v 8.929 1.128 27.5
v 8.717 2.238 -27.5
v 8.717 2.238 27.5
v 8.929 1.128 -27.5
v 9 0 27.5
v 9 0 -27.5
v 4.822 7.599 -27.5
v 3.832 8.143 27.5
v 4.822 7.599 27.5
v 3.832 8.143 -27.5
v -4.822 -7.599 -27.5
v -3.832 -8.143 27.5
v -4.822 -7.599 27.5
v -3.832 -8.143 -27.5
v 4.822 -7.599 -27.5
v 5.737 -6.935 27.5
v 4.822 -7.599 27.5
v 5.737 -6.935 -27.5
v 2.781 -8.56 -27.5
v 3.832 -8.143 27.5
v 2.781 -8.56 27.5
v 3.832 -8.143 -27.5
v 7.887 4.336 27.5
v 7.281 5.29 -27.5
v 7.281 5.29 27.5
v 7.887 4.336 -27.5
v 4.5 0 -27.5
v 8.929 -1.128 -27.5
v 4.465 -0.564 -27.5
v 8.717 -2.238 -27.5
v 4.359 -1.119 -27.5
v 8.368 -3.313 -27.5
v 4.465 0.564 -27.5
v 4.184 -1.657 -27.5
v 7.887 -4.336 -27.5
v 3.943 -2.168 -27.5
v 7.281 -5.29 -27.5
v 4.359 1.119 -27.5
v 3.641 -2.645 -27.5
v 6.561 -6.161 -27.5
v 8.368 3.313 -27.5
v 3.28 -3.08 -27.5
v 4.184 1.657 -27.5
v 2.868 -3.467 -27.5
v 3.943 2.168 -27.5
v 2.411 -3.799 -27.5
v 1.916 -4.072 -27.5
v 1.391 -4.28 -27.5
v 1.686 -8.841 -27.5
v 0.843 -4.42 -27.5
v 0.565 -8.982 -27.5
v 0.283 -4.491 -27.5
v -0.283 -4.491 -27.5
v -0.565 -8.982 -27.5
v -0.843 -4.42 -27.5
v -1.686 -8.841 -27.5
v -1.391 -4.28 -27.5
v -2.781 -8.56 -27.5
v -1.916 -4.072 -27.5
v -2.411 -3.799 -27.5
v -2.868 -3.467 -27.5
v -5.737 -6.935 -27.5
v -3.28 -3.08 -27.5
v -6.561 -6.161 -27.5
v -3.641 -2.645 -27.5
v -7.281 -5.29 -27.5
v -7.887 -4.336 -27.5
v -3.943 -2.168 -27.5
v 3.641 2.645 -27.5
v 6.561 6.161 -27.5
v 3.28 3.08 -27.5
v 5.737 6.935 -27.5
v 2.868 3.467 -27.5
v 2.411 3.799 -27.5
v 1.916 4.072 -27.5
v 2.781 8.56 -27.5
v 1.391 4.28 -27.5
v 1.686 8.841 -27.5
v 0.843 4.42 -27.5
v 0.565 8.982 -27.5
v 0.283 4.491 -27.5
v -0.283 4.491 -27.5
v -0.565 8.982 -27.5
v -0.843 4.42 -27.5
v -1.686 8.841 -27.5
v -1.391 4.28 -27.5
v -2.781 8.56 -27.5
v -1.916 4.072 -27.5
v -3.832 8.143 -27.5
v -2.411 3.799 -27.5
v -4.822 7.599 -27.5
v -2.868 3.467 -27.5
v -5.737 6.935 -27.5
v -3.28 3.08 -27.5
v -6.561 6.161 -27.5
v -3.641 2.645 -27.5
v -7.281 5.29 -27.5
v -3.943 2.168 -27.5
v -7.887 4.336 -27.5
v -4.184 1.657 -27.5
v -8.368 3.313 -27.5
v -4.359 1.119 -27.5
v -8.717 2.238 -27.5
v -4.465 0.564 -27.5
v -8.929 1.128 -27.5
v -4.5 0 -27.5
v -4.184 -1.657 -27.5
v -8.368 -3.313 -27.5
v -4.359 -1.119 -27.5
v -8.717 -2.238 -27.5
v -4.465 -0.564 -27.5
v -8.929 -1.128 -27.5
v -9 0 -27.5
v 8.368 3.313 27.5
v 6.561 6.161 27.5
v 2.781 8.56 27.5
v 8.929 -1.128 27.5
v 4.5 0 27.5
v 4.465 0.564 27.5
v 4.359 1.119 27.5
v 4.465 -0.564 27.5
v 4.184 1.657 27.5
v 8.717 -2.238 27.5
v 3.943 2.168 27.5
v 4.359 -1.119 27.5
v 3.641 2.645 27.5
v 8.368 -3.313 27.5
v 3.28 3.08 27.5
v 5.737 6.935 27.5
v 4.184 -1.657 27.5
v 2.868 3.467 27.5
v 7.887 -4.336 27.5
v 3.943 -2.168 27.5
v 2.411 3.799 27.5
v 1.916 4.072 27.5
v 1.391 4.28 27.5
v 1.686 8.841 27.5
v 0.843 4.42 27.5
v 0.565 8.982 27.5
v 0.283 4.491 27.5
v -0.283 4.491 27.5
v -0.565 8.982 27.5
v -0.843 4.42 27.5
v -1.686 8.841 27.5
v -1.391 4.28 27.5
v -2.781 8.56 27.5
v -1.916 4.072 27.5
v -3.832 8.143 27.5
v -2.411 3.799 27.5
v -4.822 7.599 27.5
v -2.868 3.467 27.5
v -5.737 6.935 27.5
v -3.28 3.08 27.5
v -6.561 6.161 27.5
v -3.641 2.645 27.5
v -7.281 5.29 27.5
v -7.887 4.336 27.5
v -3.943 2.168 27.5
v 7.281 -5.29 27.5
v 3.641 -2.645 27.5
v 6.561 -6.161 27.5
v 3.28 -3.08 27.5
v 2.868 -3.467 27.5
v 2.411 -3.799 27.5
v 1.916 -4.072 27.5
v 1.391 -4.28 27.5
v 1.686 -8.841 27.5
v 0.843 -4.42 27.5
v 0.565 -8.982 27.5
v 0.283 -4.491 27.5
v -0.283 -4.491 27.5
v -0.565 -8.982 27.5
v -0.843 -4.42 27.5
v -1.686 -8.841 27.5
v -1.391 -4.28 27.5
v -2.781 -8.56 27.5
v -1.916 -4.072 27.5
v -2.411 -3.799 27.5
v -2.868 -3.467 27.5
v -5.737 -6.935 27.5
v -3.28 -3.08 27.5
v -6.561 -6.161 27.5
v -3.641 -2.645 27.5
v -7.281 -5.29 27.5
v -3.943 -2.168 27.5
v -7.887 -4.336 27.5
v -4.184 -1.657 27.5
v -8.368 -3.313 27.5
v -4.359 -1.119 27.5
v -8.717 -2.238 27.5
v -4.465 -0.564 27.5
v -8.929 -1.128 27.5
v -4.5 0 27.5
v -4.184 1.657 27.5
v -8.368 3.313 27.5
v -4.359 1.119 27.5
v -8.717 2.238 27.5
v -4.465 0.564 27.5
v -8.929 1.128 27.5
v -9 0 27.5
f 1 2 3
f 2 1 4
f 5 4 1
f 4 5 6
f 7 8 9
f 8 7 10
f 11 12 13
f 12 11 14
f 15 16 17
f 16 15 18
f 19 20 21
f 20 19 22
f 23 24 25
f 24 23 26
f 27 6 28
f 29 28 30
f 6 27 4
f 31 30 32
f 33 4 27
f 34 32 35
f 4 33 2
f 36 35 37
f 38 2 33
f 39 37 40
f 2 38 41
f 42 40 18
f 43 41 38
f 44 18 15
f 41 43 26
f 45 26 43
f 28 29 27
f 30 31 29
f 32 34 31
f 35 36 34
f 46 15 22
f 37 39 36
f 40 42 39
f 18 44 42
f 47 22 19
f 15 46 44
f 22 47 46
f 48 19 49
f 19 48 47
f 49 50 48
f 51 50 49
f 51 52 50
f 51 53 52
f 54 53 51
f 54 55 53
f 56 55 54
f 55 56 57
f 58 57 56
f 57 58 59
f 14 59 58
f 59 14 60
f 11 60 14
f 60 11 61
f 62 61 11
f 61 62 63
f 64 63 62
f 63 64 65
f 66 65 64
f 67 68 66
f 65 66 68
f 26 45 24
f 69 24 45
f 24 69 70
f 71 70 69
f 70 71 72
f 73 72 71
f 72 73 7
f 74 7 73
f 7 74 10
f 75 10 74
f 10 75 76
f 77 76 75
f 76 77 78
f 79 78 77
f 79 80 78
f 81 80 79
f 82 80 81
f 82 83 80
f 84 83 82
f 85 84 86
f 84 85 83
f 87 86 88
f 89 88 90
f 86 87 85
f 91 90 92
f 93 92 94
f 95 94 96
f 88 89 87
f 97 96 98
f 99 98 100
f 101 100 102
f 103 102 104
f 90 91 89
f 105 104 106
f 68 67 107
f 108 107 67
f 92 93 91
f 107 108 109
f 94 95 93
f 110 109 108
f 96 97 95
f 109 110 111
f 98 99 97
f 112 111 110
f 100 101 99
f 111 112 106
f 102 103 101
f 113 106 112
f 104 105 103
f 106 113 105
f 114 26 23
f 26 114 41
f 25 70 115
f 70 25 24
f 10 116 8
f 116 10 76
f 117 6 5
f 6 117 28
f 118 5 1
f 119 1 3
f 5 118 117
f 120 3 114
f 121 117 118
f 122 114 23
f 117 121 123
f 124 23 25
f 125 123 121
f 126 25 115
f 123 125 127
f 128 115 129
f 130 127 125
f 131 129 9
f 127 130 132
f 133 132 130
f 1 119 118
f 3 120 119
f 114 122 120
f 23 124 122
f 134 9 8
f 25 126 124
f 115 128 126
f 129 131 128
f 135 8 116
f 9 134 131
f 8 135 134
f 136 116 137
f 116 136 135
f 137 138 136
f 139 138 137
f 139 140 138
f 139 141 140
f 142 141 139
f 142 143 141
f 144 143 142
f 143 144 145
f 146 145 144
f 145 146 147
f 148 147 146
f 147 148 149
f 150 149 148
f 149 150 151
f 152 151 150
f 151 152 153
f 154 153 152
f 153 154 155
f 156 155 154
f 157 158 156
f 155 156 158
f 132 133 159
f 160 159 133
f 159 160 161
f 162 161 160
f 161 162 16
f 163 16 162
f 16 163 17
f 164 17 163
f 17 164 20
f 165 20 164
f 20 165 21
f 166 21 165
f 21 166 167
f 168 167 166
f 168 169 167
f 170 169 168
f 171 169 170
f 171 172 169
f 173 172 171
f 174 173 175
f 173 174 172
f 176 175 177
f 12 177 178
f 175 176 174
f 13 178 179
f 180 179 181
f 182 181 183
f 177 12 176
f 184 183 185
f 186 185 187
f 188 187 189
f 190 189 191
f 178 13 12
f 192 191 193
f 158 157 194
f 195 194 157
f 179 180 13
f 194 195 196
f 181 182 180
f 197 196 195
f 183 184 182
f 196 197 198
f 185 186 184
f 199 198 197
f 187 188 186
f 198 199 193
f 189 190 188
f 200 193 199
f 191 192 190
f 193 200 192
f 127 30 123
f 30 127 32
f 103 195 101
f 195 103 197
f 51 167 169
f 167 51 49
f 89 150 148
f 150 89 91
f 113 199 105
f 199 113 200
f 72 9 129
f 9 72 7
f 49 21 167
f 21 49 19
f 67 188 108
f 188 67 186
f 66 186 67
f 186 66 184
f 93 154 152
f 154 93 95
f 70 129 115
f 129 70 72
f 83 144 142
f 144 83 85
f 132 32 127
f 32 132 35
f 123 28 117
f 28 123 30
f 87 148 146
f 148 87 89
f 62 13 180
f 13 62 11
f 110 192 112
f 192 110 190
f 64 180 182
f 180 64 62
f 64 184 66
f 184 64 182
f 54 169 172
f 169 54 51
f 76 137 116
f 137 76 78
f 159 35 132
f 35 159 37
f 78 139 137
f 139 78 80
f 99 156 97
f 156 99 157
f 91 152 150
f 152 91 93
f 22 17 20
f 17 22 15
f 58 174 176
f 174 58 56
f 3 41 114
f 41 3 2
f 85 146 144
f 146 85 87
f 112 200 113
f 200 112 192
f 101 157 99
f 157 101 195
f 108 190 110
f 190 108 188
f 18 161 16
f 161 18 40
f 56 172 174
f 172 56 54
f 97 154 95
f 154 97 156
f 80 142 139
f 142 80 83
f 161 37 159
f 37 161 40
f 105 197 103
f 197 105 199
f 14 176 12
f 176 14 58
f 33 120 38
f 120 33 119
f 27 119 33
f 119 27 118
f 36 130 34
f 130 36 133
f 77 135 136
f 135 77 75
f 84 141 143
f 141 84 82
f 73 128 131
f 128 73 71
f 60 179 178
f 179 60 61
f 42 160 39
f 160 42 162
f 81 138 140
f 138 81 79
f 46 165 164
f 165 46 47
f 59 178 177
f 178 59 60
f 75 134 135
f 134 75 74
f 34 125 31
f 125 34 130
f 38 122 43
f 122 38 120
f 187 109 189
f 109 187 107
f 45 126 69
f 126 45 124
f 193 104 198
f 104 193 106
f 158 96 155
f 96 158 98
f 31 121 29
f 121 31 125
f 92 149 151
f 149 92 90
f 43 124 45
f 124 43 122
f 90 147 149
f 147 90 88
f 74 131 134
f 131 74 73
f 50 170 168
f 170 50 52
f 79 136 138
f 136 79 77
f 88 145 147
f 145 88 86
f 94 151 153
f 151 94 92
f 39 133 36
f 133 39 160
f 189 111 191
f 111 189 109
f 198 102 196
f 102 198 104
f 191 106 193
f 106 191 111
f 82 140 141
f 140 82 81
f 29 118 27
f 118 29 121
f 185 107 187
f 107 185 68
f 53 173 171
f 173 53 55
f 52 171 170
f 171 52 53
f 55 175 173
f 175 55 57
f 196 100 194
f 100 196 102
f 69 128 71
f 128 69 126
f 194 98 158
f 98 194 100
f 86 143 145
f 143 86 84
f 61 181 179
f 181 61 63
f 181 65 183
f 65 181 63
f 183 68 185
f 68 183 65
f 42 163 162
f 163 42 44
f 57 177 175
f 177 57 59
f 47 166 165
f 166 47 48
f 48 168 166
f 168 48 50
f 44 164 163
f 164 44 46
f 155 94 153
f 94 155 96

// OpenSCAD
$fn = 50;


difference() {
	union() {
		translate(v = [0, 0, -27.5000000000]) {
			cylinder(h = 55, r = 9.0000000000);
		}
	}
	union() {
		translate(v = [0, 0, -100.0000000000]) {
			cylinder(h = 200, r = 4.5000000000);
		}
	}
}
